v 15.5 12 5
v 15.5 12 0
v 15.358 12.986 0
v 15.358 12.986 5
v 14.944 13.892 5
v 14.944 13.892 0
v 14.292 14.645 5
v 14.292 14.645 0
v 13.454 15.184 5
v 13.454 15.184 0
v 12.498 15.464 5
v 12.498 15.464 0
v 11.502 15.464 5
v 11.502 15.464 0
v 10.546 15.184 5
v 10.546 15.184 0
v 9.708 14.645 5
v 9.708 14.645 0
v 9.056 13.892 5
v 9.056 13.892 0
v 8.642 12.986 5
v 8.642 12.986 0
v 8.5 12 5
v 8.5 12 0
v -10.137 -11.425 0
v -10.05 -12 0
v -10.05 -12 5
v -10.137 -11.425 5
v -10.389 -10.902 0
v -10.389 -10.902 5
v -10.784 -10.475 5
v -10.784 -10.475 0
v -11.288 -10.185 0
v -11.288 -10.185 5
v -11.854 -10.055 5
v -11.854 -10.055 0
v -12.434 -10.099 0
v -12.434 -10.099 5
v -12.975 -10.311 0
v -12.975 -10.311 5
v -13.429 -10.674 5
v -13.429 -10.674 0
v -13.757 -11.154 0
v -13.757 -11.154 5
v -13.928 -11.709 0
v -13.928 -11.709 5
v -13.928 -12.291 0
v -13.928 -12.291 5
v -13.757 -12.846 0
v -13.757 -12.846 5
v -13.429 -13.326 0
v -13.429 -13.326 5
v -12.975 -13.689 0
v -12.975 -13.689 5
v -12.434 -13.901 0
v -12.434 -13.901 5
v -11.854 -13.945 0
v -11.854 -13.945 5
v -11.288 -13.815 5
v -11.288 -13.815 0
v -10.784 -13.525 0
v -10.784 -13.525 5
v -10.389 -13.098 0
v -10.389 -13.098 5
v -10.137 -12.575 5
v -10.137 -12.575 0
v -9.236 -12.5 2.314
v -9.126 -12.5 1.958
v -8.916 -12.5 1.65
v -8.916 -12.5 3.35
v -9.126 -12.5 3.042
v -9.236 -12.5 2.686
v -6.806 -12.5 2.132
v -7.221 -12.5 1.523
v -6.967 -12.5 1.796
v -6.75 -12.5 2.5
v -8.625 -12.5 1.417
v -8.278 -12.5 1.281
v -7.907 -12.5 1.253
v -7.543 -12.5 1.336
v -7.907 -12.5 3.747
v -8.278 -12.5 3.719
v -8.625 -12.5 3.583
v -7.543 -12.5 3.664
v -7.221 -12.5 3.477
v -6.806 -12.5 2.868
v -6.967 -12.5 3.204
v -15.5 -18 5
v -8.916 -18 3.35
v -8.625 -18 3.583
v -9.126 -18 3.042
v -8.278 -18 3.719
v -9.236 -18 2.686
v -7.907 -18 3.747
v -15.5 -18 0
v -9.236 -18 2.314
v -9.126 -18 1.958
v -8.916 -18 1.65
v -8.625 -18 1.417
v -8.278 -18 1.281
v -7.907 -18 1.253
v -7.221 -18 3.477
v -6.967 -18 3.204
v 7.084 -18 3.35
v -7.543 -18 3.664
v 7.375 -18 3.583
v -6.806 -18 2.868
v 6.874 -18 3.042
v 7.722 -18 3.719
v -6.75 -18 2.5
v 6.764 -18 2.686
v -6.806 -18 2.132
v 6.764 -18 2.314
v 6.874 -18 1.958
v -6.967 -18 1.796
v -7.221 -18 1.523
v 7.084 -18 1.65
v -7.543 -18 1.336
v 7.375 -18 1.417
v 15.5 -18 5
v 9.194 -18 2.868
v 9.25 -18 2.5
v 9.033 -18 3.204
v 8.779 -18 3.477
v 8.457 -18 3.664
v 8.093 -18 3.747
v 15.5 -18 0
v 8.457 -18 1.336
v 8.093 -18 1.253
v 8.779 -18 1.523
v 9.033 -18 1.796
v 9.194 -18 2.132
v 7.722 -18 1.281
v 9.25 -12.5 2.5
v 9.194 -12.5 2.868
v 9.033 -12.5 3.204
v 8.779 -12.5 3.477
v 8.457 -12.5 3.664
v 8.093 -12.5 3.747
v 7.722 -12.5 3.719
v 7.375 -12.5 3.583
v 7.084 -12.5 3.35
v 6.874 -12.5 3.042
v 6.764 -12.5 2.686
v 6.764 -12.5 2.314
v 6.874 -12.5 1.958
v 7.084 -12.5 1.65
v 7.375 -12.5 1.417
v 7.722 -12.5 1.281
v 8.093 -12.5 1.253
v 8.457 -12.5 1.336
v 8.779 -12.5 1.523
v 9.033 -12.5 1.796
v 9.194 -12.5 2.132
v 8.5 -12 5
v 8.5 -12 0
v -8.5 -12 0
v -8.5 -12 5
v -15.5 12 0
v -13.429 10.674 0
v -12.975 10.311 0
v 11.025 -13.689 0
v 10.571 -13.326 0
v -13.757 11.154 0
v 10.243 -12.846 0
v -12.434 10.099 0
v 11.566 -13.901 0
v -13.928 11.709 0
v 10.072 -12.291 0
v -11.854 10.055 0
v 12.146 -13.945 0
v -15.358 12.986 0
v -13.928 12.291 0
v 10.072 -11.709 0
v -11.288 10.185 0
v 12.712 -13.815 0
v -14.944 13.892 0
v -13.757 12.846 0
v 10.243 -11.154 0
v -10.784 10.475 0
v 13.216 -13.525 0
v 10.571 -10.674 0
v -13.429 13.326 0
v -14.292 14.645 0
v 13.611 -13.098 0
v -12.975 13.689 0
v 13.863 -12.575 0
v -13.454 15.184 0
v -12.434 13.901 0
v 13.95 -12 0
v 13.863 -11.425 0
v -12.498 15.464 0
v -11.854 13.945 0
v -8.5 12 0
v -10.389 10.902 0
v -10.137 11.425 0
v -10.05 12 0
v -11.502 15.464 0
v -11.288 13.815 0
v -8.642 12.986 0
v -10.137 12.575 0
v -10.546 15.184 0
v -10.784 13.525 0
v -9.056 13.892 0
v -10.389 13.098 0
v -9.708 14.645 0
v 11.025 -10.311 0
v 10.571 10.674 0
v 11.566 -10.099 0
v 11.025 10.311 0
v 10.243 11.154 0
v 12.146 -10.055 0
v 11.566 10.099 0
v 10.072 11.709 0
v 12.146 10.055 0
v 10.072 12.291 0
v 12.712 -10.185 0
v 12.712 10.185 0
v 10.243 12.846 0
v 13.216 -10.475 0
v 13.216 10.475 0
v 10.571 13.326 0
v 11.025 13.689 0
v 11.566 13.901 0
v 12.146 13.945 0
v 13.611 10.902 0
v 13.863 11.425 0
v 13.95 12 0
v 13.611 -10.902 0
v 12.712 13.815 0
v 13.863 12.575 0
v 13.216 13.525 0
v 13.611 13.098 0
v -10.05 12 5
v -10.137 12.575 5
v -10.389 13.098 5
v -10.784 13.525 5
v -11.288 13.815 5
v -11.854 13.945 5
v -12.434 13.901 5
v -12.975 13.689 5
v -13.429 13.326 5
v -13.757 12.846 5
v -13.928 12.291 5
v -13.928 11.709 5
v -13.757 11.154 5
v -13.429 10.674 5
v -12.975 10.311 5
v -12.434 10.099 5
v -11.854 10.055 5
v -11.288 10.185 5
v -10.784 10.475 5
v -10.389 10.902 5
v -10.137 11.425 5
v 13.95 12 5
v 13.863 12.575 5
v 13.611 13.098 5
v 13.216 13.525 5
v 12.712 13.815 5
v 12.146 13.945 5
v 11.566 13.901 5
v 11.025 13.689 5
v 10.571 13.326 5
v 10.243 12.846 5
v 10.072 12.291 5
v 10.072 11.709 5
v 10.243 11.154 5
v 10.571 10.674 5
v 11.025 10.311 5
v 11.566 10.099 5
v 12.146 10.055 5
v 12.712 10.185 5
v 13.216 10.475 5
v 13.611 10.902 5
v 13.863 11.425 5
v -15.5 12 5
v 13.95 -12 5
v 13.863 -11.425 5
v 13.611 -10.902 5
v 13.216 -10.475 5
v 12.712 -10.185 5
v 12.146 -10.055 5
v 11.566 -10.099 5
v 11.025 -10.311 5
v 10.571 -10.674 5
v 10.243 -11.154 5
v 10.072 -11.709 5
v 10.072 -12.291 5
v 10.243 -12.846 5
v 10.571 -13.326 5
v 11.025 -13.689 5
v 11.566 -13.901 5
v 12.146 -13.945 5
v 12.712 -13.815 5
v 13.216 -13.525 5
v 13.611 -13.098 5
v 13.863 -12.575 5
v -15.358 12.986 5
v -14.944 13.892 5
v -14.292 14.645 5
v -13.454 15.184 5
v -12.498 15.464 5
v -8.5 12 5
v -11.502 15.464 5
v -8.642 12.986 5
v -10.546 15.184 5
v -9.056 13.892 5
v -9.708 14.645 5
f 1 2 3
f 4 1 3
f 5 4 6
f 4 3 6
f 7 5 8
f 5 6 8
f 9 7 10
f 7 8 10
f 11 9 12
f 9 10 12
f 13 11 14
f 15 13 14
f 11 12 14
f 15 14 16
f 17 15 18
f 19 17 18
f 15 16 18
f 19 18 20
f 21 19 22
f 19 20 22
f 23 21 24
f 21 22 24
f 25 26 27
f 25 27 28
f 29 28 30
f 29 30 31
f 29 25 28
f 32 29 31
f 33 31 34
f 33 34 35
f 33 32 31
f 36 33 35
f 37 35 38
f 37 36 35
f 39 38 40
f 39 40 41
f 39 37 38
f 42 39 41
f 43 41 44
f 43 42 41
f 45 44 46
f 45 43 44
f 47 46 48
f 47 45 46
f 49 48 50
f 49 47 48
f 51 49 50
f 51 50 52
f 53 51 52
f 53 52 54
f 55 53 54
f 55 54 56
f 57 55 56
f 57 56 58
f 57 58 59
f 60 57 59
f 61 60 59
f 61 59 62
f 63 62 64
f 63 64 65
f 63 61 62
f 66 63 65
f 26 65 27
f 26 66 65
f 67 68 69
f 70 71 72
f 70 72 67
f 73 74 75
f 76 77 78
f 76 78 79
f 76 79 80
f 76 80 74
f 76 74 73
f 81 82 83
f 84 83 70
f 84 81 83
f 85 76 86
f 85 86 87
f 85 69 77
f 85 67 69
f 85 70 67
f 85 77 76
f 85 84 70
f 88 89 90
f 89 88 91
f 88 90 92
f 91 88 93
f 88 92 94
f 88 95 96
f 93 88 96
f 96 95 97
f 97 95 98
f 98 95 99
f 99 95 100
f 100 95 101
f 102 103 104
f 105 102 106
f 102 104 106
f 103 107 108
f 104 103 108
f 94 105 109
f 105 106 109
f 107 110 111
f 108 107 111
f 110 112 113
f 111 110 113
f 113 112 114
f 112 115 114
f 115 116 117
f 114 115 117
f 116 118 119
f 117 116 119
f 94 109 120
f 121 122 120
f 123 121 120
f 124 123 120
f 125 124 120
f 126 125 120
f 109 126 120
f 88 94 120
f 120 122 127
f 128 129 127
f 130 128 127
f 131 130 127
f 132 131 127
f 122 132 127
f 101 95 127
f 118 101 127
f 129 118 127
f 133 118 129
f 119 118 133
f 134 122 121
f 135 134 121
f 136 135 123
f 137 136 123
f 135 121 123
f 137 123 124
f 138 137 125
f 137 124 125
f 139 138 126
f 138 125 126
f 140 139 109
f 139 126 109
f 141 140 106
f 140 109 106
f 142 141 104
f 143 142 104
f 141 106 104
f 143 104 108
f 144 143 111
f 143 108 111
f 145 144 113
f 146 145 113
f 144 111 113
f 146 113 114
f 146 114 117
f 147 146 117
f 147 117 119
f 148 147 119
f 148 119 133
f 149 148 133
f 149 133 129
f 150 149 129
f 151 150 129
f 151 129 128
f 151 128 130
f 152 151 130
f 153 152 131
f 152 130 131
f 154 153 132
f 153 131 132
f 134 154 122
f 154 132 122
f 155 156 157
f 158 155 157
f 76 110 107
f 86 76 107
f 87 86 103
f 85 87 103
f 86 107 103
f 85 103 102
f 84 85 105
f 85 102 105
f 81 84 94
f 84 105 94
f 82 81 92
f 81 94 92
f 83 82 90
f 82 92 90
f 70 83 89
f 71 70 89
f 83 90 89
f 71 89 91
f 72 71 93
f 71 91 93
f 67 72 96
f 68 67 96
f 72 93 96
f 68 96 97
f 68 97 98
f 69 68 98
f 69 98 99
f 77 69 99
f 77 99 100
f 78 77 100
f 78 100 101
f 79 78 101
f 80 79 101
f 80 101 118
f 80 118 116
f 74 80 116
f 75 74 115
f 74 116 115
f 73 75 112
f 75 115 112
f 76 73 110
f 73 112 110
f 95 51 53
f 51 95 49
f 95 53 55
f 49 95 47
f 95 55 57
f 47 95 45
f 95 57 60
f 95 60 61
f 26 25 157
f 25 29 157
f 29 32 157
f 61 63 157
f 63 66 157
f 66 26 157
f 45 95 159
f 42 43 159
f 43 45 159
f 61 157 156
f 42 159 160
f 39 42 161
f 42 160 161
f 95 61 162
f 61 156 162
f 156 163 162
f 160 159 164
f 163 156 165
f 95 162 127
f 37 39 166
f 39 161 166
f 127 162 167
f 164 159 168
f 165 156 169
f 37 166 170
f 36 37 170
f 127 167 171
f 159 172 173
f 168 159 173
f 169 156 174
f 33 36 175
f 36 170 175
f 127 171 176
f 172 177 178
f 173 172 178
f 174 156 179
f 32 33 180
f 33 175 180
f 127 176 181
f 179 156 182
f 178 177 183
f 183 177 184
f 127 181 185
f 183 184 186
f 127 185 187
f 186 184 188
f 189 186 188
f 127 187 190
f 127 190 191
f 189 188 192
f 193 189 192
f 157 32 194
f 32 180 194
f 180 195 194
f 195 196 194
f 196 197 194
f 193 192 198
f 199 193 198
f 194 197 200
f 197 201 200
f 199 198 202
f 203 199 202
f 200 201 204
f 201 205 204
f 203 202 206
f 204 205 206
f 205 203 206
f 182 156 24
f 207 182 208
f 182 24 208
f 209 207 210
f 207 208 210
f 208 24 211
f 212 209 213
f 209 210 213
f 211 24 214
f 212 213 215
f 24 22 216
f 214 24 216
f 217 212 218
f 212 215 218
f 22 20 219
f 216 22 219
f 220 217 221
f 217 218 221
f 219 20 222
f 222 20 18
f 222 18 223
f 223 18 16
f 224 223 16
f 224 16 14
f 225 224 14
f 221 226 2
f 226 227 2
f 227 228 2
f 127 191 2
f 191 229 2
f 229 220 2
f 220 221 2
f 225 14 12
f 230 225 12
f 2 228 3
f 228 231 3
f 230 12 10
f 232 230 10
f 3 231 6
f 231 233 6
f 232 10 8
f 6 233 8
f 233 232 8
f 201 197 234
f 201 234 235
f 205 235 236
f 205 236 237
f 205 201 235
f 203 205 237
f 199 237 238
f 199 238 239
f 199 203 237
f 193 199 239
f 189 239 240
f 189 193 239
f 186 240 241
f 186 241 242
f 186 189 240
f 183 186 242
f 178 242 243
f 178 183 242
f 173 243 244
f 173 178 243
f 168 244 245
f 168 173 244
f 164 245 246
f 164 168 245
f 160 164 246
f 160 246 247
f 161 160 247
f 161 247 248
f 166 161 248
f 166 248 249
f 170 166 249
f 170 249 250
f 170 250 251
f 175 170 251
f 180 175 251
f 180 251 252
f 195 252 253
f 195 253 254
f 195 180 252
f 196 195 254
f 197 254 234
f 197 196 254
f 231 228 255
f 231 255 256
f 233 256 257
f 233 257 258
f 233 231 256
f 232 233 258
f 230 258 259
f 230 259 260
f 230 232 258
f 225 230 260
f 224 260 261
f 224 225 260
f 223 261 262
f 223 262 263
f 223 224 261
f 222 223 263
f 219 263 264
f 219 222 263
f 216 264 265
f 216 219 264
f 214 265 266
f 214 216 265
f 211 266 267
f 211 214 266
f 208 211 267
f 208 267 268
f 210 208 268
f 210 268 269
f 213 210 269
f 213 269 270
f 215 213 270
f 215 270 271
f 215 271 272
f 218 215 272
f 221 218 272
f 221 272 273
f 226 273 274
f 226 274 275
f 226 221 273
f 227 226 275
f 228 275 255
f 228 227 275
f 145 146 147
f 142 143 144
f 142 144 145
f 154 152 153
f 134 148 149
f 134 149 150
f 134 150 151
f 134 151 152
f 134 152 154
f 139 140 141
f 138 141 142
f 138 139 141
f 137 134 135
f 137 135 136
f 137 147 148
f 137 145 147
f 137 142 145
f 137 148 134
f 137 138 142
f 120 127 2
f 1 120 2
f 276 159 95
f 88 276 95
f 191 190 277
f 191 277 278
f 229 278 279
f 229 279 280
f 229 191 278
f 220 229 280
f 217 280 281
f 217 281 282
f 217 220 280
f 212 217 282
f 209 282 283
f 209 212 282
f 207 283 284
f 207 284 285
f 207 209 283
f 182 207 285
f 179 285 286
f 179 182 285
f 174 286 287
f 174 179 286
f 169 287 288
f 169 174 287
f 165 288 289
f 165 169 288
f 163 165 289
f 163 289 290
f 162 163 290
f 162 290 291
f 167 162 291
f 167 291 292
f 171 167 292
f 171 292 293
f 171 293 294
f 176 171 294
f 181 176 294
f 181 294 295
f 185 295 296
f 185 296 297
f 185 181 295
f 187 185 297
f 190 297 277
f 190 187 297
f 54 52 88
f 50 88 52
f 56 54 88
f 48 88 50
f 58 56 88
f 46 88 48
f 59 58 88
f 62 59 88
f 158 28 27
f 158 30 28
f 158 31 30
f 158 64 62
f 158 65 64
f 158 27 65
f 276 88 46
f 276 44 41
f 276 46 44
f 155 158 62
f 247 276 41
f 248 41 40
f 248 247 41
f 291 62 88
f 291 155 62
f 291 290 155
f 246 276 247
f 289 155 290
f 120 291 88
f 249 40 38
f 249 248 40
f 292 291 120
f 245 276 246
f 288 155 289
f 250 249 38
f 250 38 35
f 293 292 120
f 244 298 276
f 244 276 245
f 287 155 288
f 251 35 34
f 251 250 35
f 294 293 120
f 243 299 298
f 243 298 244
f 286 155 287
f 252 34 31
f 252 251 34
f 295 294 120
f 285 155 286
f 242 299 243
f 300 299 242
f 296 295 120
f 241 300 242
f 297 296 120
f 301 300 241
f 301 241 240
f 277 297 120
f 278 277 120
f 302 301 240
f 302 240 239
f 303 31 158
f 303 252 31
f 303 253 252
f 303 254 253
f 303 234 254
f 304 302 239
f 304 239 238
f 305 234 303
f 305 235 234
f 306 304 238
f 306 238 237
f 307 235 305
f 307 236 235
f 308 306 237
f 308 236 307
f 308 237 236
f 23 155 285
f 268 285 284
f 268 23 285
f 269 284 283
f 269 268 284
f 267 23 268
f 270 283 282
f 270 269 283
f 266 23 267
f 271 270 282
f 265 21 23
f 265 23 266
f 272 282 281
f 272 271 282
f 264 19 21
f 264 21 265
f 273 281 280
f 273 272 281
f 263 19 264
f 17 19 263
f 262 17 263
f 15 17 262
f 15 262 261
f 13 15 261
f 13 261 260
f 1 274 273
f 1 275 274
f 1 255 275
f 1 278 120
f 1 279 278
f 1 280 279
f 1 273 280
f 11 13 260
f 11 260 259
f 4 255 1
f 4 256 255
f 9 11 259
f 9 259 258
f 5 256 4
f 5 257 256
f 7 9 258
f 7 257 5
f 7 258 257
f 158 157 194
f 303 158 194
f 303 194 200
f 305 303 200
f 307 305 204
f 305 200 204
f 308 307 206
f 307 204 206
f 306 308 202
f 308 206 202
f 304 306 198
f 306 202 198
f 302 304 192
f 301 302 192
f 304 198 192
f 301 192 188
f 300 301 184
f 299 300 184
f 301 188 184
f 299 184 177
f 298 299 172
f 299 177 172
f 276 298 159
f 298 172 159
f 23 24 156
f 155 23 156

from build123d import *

# Parameters (mm, degrees)
SKETCH1_R           = 1.95
BOSS_EXTRUDE1_DEPTH = 5
SKETCH4_R           = 1.25
CUT_EXTRUDE3_DEPTH  = 5.5


with BuildPart() as part:
    # Sketch1 → Boss-Extrude1 (new body)
    with BuildSketch(Plane.XY):
        with BuildLine():
            ThreePointArc((-8.5, 12), (-12, 15.5), (-15.5, 12))
            Line((-15.5, 12), (-15.5, -12))
            Line((-15.5, -12), (-15.5, -12.97105896))
            Line((-15.5, -12.97105896), (-15.5, -18))
            Line((-15.5, -18), (0, -18))
            Line((0, -18), (15.5, -18))
            Line((15.5, -18), (15.5, -12))
            Line((15.5, -12), (15.5, 12))
            ThreePointArc((15.5, 12), (12, 15.5), (8.5, 12))
            Line((8.5, 12), (8.5, -12))
            Line((8.5, -12), (0, -12))
            Line((0, -12), (-8.5, -12))
            Line((-8.5, -12), (-8.5, 12))
        make_face()
        with Locations((-12, -12)):
            Circle(SKETCH1_R, mode=Mode.SUBTRACT)
        with Locations((12, -12)):
            Circle(SKETCH1_R, mode=Mode.SUBTRACT)
        with Locations((-12, 12)):
            Circle(SKETCH1_R, mode=Mode.SUBTRACT)
        with Locations((12, 12)):
            Circle(SKETCH1_R, mode=Mode.SUBTRACT)
    extrude(amount=BOSS_EXTRUDE1_DEPTH)

    # Sketch4 → Cut-Extrude3 (cut)
    with BuildSketch(Plane.XZ.offset(18)):
        with Locations((-8, 2.5)):
            Circle(SKETCH4_R)
        with Locations((8, 2.5)):
            Circle(SKETCH4_R)
    extrude(amount=-CUT_EXTRUDE3_DEPTH, mode=Mode.SUBTRACT)


solid = part.part
